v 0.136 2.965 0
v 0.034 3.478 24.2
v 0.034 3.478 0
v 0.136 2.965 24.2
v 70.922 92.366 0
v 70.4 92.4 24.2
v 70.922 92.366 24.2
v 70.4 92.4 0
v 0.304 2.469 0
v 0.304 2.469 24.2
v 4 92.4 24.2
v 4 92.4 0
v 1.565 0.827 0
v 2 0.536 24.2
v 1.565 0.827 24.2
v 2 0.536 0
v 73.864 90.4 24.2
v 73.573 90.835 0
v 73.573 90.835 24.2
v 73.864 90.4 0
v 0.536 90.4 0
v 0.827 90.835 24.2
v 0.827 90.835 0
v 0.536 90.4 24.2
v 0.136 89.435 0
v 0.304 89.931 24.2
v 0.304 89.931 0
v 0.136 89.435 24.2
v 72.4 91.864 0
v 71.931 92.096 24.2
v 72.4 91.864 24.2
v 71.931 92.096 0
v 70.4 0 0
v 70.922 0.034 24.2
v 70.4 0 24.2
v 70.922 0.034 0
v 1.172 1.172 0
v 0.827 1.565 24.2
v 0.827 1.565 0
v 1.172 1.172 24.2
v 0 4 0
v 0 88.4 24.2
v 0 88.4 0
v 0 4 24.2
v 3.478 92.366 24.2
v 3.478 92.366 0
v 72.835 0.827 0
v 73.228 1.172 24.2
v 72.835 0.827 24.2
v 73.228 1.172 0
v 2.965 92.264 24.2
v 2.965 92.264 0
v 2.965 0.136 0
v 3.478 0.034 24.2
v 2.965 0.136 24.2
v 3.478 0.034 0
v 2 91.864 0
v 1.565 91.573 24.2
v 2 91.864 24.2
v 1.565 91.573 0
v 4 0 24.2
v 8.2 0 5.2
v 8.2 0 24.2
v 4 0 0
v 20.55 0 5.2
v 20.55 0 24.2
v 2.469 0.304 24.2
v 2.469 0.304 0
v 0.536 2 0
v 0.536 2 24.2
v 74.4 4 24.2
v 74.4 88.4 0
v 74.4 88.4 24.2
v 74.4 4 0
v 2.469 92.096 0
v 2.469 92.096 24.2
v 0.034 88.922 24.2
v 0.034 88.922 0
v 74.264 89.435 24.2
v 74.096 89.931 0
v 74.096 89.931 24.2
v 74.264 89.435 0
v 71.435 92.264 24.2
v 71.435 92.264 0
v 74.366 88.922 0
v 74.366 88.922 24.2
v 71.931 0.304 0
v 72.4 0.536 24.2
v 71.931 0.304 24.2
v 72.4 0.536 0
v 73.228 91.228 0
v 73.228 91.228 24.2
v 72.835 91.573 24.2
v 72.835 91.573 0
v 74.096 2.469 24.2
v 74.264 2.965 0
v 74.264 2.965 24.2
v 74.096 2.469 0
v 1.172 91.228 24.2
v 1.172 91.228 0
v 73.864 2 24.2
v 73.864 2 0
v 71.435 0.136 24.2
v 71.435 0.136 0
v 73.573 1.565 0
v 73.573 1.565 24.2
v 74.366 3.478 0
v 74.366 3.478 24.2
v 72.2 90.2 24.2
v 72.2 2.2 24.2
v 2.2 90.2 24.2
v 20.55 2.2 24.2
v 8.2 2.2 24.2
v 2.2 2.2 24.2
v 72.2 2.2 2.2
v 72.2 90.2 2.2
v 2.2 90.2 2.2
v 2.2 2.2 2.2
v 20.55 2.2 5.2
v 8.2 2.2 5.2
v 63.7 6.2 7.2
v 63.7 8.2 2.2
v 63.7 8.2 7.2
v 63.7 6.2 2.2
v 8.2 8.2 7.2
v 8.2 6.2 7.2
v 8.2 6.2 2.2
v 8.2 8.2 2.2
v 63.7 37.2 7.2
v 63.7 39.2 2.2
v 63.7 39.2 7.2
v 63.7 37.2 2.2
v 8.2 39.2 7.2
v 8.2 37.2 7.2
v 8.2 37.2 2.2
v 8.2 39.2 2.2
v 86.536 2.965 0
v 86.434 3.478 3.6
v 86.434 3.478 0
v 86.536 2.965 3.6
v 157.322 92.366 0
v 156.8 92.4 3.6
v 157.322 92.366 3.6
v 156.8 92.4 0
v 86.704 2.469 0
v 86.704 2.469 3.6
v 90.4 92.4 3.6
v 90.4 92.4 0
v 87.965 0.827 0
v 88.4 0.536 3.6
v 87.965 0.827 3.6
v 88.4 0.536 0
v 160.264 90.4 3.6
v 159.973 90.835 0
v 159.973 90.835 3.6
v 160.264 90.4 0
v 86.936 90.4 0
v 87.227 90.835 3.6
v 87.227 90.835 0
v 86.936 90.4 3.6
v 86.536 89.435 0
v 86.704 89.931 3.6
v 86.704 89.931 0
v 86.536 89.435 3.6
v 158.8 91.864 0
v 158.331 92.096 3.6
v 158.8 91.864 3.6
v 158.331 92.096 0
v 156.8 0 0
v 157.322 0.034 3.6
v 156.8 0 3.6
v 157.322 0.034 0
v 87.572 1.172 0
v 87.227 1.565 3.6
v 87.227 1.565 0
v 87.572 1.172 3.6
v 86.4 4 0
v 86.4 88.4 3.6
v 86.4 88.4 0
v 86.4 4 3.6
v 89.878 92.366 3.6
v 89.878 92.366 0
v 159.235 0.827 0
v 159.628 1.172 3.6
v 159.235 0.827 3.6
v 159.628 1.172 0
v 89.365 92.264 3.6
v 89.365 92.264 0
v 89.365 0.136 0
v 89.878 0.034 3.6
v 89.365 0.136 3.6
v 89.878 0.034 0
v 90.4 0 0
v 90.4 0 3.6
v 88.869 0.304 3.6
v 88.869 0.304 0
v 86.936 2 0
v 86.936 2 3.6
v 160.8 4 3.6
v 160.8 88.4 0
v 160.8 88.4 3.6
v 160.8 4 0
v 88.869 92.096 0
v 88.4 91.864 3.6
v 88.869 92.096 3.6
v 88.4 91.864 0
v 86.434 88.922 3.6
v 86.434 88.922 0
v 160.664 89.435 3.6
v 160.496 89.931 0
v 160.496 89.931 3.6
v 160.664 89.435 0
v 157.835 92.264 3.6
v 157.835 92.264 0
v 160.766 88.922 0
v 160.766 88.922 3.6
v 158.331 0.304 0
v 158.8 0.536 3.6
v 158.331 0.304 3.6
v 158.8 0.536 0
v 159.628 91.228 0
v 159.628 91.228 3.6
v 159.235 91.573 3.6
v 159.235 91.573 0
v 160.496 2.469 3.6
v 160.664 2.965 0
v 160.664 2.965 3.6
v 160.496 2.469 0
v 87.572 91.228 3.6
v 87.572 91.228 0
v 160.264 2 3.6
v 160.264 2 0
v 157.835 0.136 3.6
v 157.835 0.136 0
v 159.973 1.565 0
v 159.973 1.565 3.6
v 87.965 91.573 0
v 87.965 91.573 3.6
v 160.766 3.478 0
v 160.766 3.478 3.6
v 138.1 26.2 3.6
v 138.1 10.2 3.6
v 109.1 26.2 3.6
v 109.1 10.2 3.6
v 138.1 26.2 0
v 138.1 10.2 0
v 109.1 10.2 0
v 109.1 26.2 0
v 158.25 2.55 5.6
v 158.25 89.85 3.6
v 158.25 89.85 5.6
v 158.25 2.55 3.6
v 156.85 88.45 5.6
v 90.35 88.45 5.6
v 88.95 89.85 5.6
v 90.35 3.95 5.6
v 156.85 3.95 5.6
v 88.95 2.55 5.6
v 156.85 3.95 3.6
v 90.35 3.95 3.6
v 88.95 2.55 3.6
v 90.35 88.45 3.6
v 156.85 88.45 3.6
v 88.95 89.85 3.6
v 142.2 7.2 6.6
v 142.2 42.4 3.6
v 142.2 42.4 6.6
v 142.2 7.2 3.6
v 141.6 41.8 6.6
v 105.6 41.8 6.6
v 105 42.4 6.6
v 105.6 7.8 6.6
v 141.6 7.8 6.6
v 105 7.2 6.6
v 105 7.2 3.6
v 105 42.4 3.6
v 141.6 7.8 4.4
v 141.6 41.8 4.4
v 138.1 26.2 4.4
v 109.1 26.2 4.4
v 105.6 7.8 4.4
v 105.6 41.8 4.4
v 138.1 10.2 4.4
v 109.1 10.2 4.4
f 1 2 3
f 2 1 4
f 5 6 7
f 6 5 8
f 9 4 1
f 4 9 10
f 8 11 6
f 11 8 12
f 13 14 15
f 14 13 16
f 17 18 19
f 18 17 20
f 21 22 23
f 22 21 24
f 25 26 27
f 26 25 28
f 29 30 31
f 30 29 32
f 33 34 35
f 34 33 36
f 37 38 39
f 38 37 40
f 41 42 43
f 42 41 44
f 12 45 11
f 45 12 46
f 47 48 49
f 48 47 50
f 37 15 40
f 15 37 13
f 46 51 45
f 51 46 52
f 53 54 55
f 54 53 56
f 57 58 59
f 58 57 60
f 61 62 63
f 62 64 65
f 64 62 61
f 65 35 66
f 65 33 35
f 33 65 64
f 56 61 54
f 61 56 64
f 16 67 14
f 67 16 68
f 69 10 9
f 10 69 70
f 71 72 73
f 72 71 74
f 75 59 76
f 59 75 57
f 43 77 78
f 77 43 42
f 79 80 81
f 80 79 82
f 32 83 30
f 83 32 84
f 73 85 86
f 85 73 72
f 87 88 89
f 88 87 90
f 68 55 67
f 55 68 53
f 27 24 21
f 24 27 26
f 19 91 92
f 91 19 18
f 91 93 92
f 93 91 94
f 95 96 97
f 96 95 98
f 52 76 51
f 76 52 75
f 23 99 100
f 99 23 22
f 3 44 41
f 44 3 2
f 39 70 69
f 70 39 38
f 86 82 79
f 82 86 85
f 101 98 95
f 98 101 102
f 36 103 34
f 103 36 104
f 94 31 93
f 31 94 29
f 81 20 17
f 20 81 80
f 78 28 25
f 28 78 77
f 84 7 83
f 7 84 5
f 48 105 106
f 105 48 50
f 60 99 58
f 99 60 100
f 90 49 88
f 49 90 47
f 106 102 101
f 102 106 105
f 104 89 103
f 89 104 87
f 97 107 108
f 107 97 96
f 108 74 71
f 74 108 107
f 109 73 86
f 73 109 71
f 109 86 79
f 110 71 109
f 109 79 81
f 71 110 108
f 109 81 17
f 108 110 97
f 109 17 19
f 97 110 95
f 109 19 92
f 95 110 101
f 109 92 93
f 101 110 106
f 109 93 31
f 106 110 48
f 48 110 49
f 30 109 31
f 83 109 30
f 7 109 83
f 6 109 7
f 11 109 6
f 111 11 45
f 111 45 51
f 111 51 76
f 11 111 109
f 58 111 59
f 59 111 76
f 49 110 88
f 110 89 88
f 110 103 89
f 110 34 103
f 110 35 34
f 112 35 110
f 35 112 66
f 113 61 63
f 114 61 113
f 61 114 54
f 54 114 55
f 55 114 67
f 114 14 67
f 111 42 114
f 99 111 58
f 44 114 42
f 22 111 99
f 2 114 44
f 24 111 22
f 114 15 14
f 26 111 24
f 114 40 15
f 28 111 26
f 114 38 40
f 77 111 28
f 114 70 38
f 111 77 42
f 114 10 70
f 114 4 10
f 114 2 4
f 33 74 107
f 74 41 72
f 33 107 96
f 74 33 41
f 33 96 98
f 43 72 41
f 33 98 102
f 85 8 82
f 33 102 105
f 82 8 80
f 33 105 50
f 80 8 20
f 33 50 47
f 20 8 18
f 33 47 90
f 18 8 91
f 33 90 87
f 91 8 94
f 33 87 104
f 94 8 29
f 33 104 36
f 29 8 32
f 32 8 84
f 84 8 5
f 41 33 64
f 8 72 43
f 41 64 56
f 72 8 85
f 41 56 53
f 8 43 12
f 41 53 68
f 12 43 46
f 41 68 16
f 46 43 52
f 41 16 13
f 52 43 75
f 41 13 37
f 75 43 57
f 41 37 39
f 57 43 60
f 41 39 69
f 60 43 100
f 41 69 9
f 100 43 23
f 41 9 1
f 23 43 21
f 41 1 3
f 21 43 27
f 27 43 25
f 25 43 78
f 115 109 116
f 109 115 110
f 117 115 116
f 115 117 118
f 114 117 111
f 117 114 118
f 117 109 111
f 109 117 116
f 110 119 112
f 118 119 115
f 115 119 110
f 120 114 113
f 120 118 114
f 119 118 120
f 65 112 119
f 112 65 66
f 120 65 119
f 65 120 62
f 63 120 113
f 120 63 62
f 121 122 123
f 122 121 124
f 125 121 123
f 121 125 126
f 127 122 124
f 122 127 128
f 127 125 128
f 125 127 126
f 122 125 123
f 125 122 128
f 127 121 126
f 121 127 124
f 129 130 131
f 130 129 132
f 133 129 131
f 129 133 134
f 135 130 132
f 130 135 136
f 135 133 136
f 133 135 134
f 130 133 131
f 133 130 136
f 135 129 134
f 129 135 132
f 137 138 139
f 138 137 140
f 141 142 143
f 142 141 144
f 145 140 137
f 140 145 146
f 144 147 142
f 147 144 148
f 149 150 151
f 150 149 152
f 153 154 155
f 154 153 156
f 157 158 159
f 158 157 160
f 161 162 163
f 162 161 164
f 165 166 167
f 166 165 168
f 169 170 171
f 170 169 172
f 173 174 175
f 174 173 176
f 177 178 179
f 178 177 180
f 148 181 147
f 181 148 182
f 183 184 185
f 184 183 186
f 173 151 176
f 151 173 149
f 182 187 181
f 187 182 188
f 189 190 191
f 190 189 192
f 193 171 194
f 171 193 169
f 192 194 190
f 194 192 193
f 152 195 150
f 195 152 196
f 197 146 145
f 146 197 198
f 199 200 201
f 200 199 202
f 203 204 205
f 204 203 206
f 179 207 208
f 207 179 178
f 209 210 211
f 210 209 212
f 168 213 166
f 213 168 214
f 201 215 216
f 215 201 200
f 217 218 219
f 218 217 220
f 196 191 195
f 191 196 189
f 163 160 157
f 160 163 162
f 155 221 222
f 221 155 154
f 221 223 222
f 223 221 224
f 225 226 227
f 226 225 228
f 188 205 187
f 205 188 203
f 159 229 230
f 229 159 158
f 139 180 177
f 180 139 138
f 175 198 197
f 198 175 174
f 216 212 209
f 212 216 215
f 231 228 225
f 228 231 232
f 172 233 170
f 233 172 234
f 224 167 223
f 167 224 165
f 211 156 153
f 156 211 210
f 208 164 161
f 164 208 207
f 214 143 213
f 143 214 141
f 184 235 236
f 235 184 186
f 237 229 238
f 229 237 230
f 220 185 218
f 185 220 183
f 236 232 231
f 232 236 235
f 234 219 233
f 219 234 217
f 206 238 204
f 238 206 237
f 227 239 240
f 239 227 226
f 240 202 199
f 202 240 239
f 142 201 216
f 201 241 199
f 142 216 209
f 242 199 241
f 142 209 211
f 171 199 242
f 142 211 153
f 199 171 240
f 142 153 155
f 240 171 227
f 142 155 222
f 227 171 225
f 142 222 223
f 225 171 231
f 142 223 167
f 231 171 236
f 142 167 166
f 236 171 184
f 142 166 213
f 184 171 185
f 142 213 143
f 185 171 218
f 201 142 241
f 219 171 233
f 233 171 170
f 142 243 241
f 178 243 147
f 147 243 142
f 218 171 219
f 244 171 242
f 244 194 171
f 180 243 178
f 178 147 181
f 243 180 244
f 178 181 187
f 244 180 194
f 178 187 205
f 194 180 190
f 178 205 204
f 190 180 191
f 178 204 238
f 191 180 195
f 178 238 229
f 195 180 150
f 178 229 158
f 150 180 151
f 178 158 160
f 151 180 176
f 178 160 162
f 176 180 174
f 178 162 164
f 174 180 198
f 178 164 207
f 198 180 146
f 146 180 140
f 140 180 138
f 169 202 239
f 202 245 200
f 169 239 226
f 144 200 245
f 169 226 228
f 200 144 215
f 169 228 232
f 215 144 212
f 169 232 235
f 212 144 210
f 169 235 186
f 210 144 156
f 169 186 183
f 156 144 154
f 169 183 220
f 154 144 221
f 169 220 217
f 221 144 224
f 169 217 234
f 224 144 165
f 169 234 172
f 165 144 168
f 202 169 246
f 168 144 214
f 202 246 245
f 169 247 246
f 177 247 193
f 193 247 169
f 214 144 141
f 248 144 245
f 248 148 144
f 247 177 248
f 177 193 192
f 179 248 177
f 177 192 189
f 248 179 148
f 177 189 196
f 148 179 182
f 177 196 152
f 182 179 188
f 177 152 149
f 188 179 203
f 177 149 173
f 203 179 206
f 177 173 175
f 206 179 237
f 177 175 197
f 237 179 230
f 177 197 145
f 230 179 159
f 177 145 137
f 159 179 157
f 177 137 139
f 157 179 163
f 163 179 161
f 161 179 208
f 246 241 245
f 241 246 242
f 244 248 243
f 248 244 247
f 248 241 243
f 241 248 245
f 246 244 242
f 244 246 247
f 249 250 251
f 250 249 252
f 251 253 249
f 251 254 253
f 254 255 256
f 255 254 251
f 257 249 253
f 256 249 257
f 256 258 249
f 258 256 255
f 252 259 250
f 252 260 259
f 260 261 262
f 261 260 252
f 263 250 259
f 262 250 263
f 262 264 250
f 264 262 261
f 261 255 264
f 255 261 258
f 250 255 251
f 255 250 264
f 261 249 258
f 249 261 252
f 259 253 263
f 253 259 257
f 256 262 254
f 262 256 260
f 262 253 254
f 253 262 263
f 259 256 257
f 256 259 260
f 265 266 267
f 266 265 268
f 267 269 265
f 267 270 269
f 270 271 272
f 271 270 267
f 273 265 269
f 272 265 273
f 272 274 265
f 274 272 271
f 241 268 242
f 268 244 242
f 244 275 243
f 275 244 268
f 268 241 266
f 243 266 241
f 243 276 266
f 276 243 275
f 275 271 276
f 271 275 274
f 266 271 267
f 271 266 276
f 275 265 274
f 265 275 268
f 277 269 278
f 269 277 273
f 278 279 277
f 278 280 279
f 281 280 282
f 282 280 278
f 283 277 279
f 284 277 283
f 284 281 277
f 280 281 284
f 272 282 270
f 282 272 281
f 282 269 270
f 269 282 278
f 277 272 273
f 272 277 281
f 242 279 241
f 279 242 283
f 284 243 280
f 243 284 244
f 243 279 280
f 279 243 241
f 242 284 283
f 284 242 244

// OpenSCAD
// Version 1: gedruckter Prototyp (Unterschale + Deckel). Version 2: housing-v2.scad
// Zwei Druckteile, Maße in mm. In OpenSCAD: F5 Vorschau, F6 STL.
//
// teil = 0  beide nebeneinander (nur anschauen)
// teil = 1  Unterschale  — mit der Öffnung nach oben aufs Druckbett
// teil = 2  Deckel       — Sichtseite nach unten (Fensterschnitt nach oben)

teil = 0;

$fn = 48;
wand = 2.2;
spiel = 0.35;

// Innenraum
innen_x = 70;
innen_y = 88;
innen_z = 22;

// DevKit 30-Pin (typisch 54.5 x 28). USB an der kurzen Seite.
esp_x = 55.5;
esp_y = 29.0;
usb_b = 12;
usb_h = 8;

// 1,3"-SH1106-Modul, Sichtfenster etwas kleiner als das Glas
oled_modul_x = 36;
oled_modul_y = 34;
fenster_x = 29;
fenster_y = 16;

aussen_x = innen_x + 2 * wand;
aussen_y = innen_y + 2 * wand;

module platte(x, y, z, r = 3) {
  hull() {
    for (px = [r, x - r], py = [r, y - r])
      translate([px, py, 0]) cylinder(h = z, r = r);
  }
}

// Unterschale: offener Kasten, Boden auf dem Bett, USB-Schlitz von oben
// (kein Loch in der Wand → ohne Stützen druckbar).
module unterschale() {
  difference() {
    platte(aussen_x, aussen_y, wand + innen_z, 4);
    translate([wand, wand, wand])
      cube([innen_x, innen_y, innen_z + 1]);
    // USB: Schlitz von der Oberkante runter, kurze Wand y=0
    translate([wand + 6, -1, wand + 3])
      cube([usb_b + spiel, wand + 3, innen_z]);
  }
  // Zwei Leisten, DevKit liegt dazwischen, USB zur Schlitz-Wand
  translate([wand + 6, wand + 4, wand]) {
    cube([esp_x, 2, 5]);
    translate([0, 2 + esp_y, 0]) cube([esp_x, 2, 5]);
  }
}

// Deckel: flache Platte, Fenster vorn, Lippe greift in den Kasten.
// OLED von innen gegen das Fenster kleben/legen.
module deckel() {
  difference() {
    platte(aussen_x, aussen_y, wand + 1.4, 4);
    translate([
      (aussen_x - fenster_x) / 2,
      wand + 8,
      -1
    ]) cube([fenster_x, fenster_y, wand + 4]);
  }
  // Lippe nach oben (beim Drucken: Deckel mit Fenster nach oben, Lippe nach oben)
  translate([wand + spiel, wand + spiel, wand + 1.4]) difference() {
    cube([innen_x - 2 * spiel, innen_y - 2 * spiel, 2]);
    translate([1.4, 1.4, -0.1])
      cube([innen_x - 2 * spiel - 2.8, innen_y - 2 * spiel - 2.8, 3]);
  }
  // Mulde für das OLED-Modul (innen, um das Fenster)
  translate([
    (aussen_x - oled_modul_x) / 2 - 0.6,
    wand + 5,
    wand + 1.4
  ]) difference() {
    cube([oled_modul_x + 1.2, oled_modul_y + 1.2, 3]);
    translate([0.6, 0.6, 0.8]) cube([oled_modul_x, oled_modul_y, 4]);
    translate([
      (oled_modul_x + 1.2 - fenster_x) / 2,
      3,
      -1
    ]) cube([fenster_x, fenster_y, 6]);
  }
}

if (teil == 1) {
  unterschale();
} else if (teil == 2) {
  deckel();
} else {
  unterschale();
  translate([aussen_x + 12, 0, 0]) deckel();
}
